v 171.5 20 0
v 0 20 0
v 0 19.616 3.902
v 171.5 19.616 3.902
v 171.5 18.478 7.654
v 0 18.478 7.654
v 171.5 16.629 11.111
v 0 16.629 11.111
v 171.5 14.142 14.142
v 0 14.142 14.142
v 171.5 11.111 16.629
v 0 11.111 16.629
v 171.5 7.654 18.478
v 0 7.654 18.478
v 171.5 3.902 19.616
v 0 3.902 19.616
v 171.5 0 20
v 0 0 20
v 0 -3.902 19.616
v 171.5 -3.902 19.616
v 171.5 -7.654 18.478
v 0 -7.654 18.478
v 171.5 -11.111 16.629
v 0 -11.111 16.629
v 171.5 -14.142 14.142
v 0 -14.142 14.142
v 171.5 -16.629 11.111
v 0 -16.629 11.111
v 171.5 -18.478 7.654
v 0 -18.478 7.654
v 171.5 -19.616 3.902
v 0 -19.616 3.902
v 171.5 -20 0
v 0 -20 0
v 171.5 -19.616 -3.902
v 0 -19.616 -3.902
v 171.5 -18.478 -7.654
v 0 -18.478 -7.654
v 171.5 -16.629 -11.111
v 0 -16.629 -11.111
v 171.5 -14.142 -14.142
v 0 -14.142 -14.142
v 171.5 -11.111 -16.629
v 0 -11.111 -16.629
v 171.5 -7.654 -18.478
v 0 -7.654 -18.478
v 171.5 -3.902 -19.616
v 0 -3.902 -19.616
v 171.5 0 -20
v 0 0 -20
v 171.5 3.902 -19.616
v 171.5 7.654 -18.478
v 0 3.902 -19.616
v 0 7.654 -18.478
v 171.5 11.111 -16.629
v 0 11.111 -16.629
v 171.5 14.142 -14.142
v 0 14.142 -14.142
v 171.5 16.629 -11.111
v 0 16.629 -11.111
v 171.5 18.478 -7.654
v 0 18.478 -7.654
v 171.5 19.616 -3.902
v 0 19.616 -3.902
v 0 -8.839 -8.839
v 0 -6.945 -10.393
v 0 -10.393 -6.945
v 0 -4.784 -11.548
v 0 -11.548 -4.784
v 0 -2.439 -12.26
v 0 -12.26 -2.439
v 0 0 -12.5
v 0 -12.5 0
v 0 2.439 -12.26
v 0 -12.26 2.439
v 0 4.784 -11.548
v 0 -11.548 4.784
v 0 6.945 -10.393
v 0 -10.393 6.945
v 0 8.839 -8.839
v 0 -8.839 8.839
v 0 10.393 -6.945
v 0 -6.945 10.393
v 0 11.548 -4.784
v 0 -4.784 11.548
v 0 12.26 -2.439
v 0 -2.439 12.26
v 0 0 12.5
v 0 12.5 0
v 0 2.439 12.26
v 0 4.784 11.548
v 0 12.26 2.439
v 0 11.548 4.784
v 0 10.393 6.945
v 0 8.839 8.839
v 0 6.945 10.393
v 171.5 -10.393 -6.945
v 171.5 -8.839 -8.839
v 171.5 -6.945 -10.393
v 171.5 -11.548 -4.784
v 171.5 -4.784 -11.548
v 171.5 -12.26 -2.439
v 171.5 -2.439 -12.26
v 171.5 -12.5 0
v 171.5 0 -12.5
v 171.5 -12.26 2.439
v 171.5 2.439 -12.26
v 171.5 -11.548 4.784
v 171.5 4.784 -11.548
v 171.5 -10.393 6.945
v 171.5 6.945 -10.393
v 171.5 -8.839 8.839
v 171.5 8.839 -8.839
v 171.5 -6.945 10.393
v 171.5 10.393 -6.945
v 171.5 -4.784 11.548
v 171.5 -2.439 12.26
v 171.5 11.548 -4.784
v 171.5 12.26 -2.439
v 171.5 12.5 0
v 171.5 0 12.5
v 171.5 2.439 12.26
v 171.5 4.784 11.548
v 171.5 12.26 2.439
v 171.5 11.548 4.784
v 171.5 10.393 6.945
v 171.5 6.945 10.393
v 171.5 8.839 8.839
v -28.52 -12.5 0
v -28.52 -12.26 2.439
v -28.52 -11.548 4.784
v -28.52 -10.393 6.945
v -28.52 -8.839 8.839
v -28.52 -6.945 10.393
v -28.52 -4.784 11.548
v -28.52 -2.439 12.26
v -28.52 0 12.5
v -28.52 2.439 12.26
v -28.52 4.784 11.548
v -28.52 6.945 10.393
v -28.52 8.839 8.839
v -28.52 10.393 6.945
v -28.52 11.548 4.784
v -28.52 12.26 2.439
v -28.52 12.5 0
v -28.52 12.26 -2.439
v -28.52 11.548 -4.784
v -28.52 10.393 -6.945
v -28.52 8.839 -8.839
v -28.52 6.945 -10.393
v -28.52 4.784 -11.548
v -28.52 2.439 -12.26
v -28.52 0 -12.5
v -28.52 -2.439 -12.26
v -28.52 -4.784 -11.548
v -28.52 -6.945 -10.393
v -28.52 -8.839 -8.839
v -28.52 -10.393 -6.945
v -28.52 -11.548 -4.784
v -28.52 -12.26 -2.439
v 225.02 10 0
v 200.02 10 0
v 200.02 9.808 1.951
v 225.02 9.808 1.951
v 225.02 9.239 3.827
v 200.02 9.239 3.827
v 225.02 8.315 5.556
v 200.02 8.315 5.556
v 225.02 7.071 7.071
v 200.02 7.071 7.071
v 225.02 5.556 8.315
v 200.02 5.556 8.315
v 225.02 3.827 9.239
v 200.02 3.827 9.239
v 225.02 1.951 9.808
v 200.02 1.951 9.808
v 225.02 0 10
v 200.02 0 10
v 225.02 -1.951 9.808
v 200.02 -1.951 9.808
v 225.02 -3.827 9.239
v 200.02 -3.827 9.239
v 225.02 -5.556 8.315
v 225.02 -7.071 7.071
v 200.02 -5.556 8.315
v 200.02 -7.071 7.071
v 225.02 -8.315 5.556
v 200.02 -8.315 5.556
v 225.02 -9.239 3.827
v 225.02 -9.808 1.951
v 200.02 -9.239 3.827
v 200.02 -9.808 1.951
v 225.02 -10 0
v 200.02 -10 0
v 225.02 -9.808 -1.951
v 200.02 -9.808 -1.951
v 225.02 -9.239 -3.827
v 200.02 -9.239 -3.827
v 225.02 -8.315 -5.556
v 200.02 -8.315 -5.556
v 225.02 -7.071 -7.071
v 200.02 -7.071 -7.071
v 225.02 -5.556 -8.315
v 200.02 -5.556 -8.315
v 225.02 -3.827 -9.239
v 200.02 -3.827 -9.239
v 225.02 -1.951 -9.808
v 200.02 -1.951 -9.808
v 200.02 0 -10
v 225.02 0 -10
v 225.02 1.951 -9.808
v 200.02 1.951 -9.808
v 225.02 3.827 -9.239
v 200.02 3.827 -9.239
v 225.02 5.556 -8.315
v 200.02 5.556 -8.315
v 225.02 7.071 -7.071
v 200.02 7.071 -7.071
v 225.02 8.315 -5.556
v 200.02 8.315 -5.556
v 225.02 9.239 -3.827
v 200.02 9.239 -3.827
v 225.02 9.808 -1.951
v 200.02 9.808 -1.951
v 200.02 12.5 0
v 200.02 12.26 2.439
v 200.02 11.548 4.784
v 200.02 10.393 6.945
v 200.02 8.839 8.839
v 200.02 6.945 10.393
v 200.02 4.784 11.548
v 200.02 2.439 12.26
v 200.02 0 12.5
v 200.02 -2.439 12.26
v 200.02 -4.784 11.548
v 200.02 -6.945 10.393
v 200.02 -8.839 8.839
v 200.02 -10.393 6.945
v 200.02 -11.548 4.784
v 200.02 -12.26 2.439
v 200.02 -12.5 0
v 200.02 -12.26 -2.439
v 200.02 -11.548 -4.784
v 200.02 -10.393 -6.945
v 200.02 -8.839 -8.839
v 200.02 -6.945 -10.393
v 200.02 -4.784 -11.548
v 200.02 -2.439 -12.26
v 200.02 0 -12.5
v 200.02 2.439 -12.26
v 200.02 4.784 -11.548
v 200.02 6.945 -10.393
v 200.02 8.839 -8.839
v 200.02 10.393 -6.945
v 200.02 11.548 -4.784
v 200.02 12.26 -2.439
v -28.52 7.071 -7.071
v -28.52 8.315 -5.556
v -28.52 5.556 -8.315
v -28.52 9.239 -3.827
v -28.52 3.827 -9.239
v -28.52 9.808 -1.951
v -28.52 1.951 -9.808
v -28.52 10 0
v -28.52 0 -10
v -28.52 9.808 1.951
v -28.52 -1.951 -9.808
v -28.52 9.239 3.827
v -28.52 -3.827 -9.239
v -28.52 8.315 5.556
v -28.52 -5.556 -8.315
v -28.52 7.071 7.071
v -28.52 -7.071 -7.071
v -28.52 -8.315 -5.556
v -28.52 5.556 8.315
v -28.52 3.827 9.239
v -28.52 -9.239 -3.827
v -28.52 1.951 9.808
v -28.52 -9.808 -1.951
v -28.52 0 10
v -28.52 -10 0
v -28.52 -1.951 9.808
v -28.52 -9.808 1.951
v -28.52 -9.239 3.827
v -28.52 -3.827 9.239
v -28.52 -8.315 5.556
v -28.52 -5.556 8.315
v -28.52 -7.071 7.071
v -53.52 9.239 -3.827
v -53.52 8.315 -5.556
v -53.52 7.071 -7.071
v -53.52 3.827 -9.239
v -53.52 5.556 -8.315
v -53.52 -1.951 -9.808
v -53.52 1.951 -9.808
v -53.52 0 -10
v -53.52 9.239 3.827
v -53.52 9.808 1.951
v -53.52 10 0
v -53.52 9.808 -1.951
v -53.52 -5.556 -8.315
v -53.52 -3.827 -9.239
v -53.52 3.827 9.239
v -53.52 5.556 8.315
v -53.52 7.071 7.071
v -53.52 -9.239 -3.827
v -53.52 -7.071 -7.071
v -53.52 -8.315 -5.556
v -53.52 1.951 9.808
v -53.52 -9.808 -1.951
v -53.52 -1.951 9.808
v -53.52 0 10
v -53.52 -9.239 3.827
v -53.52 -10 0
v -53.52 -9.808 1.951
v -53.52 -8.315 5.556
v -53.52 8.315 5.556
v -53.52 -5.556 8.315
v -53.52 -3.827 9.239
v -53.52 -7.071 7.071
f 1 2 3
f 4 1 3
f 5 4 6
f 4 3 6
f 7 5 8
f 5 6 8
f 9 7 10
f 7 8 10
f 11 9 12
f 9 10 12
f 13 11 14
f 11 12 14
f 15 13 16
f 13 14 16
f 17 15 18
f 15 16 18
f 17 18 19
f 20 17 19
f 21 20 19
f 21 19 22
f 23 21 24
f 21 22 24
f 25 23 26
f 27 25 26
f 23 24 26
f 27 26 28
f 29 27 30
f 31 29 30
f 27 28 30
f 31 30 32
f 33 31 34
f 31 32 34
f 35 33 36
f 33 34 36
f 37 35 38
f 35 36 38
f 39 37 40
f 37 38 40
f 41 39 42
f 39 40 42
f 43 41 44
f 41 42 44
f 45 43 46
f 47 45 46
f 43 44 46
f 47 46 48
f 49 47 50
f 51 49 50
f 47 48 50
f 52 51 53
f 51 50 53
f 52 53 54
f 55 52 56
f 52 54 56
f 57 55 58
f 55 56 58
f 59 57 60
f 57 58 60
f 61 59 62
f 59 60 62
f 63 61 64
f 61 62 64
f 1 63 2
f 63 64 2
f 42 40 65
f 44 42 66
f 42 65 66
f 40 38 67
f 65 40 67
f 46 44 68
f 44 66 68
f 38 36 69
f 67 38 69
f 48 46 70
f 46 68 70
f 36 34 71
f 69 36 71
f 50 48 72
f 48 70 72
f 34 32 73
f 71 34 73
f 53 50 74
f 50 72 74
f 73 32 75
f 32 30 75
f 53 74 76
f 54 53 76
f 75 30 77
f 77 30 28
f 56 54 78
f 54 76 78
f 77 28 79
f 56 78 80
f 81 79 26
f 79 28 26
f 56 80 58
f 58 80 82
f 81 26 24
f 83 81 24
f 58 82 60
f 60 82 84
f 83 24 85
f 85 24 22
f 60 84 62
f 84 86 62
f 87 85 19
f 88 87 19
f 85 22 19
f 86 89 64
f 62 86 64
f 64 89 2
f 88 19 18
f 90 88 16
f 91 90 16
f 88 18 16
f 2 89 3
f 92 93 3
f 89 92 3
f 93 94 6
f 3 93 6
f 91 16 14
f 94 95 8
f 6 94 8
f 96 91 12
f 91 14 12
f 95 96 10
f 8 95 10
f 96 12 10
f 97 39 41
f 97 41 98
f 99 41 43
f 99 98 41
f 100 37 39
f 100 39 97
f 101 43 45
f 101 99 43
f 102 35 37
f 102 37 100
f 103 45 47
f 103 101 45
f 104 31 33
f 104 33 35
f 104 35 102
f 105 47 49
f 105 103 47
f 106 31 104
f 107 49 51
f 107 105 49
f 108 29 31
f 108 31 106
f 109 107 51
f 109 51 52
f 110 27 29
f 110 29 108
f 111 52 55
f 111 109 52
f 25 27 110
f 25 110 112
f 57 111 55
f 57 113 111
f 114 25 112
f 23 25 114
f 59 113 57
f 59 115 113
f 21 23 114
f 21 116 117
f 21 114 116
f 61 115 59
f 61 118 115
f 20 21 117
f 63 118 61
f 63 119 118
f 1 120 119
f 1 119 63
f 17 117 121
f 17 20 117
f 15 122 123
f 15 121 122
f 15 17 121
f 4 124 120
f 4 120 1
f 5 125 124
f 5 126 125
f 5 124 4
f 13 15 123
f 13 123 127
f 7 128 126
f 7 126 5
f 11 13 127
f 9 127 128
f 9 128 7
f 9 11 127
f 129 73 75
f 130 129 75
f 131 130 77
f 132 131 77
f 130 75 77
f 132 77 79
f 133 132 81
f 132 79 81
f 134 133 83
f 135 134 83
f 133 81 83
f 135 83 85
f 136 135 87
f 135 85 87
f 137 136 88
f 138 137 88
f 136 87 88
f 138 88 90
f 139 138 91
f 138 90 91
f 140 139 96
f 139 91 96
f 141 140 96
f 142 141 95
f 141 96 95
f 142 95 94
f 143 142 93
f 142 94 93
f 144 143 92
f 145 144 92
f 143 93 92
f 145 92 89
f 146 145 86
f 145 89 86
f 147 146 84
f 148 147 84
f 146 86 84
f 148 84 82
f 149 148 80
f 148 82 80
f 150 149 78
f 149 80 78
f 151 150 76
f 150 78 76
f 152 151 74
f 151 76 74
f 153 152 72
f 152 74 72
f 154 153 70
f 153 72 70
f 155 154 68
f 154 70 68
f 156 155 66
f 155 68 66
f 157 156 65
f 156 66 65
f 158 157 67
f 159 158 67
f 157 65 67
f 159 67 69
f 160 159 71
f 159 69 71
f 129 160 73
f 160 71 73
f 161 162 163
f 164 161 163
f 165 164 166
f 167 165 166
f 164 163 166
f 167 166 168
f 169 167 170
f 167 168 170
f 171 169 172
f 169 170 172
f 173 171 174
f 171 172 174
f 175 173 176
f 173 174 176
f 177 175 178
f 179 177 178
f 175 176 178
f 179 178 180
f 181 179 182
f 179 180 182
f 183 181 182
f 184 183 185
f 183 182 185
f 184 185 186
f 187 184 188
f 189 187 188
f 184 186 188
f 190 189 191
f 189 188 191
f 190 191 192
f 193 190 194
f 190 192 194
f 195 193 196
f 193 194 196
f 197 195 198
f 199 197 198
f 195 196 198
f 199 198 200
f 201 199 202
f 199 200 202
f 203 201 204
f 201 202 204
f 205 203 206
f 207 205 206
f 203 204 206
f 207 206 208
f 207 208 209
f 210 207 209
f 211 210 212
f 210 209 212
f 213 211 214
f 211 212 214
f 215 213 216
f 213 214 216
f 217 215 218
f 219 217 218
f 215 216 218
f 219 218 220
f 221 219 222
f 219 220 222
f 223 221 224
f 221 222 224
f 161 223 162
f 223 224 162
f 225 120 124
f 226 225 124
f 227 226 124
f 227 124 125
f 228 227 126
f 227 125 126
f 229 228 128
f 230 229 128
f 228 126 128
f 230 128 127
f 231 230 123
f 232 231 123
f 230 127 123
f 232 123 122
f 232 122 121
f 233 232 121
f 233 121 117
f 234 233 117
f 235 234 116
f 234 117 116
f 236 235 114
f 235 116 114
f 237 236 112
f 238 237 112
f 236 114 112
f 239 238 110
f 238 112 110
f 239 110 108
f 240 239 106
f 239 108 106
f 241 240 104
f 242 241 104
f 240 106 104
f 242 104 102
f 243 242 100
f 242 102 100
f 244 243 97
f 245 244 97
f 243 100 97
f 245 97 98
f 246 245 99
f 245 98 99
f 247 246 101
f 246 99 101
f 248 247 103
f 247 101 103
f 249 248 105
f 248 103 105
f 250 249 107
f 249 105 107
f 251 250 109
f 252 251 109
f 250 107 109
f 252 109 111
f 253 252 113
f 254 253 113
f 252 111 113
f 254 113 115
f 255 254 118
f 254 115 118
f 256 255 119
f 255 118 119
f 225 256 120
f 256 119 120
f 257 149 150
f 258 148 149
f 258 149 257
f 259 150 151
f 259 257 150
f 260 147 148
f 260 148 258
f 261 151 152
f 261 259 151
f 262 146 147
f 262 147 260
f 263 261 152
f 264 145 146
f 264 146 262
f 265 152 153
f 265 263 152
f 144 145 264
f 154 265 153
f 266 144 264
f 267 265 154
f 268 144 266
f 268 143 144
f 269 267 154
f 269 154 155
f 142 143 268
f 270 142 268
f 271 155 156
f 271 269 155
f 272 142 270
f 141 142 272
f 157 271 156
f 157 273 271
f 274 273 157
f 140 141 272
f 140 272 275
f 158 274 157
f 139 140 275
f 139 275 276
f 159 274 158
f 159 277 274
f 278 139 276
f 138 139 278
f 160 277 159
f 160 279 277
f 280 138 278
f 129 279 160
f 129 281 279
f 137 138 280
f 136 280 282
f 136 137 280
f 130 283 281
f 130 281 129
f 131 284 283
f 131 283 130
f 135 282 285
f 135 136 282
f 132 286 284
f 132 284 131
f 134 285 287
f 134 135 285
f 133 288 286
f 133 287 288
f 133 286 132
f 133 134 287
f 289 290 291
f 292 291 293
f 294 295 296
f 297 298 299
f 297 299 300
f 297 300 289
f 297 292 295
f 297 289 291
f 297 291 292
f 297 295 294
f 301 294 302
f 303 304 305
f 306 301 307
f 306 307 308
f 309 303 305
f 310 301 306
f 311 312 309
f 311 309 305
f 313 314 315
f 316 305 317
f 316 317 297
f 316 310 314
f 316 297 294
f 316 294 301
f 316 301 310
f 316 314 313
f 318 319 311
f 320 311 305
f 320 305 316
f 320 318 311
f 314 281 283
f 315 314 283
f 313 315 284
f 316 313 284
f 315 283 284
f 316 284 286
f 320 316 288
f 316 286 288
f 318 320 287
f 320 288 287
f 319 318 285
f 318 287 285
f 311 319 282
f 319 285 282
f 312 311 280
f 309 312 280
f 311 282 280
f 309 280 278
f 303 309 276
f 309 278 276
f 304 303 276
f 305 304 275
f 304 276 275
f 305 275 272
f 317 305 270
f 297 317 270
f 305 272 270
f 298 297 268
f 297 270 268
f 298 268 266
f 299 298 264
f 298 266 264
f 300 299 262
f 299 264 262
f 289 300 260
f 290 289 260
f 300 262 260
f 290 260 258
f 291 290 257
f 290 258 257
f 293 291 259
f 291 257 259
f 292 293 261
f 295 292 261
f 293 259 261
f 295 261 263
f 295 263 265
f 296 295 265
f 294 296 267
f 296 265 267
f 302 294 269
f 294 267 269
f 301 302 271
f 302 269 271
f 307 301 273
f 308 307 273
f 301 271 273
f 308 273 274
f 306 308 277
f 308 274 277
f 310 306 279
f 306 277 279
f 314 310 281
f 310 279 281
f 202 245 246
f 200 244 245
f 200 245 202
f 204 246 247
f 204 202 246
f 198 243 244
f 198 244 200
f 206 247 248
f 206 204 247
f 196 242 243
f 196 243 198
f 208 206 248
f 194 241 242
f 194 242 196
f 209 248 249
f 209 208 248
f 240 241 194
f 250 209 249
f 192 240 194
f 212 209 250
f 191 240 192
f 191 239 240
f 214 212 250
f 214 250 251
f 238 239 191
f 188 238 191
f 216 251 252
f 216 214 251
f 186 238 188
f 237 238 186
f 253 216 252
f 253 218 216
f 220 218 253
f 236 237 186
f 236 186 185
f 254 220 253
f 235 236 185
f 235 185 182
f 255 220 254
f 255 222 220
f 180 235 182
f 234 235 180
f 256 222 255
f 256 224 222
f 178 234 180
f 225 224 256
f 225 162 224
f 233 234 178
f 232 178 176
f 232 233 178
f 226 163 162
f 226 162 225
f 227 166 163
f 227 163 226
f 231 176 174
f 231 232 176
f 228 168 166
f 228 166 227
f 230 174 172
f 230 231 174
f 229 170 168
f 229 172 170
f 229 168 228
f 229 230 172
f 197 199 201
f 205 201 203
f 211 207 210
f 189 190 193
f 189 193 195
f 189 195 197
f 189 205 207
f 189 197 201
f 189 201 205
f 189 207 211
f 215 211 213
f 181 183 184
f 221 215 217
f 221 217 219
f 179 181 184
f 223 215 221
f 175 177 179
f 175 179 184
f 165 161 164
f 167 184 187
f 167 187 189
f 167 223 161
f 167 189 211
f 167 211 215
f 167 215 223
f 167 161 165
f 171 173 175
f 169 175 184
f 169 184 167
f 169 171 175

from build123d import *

# Parameters (mm, degrees)
F0_R     = 20
F1_DEPTH = 171.5
F2_R     = 12.5
F3_DEPTH = 28.52
F4_R     = 12.5
F5_DEPTH = 28.52
F6_R     = 10
F7_DEPTH = 25
F8_R     = 10
F9_DEPTH = 25


with BuildPart() as f1:
    # F0 (on Right) → F1 (new body)
    with BuildSketch(Plane.YZ):
        Circle(F0_R)
    extrude(amount=F1_DEPTH)

    # F2 (on face) → F3 (join)
    with BuildSketch(Plane(origin=(0, 0, 0), x_dir=(0, -1, 0), z_dir=(-1, 0, 0))):
        Circle(F2_R)
    extrude(amount=F3_DEPTH)

    # F4 (on face) → F5 (join)
    with BuildSketch(Plane.YZ.offset(171.5)):
        Circle(F4_R)
    extrude(amount=F5_DEPTH)

    # F6 (on face) → F7 (join)
    with BuildSketch(Plane(origin=(-28.52, 0, 0), x_dir=(0, -1, 0), z_dir=(-1, 0, 0))):
        Circle(F6_R)
    extrude(amount=F7_DEPTH)

    # F8 (on face) → F9 (join)
    with BuildSketch(Plane.YZ.offset(200.02)):
        Circle(F8_R)
    extrude(amount=F9_DEPTH)


solid = f1.part
